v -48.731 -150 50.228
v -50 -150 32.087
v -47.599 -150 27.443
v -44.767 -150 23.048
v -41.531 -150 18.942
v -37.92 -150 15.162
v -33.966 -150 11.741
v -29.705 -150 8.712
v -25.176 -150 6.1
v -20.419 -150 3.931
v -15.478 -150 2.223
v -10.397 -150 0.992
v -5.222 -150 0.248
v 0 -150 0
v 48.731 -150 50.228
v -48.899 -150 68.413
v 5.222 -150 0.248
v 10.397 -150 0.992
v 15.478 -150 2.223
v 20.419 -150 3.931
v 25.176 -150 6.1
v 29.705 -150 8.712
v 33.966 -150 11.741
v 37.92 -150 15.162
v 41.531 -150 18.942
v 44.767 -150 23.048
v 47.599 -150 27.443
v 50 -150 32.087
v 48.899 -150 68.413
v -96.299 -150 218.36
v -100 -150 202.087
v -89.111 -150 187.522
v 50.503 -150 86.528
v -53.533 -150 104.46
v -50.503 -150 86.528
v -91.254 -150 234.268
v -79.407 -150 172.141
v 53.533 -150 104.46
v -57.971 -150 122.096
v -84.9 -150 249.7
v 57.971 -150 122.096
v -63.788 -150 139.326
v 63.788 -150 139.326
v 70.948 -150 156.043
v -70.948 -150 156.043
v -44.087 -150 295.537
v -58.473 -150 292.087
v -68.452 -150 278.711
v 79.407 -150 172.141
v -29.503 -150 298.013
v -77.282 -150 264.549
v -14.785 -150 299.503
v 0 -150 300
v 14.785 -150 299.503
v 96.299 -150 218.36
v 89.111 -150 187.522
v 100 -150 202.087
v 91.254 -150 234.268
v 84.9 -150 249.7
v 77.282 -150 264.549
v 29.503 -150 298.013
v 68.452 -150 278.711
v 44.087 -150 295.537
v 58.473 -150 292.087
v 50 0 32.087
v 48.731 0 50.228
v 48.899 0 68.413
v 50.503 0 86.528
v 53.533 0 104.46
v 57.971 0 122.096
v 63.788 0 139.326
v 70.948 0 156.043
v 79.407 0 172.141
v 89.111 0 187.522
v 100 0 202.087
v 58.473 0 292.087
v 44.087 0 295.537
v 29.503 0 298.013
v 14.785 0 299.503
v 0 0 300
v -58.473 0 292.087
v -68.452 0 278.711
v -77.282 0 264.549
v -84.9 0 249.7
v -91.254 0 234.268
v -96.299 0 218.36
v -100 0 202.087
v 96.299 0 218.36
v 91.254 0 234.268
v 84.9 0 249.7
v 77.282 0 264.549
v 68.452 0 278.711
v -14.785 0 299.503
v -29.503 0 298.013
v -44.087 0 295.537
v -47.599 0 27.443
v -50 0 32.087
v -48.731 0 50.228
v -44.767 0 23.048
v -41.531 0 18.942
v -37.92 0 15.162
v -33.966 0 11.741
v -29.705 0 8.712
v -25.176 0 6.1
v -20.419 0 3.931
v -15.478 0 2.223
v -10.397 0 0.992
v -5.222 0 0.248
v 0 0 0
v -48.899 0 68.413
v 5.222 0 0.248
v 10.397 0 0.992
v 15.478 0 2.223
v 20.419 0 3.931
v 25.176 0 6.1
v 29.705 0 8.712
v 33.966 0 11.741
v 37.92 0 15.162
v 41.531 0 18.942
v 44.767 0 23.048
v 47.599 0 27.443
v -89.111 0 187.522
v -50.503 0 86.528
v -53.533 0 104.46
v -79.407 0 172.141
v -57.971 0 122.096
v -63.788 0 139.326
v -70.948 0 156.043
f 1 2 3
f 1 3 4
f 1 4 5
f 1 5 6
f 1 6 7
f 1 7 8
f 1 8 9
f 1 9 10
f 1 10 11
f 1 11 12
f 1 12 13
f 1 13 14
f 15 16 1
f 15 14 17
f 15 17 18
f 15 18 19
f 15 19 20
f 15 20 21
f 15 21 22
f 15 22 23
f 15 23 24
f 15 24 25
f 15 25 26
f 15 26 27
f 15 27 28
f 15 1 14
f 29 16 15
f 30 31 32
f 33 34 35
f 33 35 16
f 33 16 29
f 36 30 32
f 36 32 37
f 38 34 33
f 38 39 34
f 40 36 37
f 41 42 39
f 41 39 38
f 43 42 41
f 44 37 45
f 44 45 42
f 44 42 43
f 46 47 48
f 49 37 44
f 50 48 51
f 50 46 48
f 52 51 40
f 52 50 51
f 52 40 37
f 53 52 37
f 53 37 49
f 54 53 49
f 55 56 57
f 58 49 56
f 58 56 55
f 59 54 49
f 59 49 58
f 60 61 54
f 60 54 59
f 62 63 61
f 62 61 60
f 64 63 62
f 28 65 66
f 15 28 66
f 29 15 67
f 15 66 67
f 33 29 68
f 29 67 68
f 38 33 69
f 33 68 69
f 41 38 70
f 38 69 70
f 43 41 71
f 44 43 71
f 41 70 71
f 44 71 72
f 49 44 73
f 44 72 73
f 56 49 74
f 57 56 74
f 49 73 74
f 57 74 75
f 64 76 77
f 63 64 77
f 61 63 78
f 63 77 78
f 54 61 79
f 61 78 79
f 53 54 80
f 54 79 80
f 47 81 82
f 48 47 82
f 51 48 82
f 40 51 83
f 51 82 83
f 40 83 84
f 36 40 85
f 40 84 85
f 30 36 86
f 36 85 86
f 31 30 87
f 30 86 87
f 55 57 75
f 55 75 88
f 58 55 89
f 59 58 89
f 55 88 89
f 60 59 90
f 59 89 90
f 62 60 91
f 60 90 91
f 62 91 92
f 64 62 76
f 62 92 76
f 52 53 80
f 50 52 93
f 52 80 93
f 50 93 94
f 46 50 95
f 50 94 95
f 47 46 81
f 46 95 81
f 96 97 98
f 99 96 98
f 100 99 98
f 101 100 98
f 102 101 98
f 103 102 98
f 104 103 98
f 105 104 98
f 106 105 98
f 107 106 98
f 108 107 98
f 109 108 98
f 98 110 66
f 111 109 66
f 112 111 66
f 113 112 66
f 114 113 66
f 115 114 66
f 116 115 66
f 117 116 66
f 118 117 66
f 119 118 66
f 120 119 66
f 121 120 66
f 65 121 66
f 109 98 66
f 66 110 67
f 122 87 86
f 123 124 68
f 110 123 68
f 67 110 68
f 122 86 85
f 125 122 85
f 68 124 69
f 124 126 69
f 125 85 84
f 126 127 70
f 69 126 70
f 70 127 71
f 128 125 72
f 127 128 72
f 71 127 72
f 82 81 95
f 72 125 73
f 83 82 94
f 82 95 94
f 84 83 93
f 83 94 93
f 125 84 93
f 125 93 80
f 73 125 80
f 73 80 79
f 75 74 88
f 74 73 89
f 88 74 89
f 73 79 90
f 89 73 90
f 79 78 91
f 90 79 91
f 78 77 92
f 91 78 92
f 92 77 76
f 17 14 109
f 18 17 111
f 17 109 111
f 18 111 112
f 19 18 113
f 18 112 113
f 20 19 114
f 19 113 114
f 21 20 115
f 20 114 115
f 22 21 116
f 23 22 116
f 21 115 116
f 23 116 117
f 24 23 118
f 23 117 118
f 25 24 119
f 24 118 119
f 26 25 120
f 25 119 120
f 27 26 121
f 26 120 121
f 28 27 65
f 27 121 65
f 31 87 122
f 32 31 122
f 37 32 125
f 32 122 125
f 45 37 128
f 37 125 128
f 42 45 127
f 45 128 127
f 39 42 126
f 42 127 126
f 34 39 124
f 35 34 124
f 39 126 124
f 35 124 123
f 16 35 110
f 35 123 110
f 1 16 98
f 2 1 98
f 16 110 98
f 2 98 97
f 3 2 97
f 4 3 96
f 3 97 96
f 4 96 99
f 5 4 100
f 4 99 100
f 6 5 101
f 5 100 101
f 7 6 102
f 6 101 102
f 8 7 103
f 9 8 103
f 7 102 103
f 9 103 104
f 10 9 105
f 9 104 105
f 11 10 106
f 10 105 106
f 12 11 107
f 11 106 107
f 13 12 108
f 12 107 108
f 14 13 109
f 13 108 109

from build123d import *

# Parameters (mm, degrees)
F1_DEPTH = 150


with BuildPart() as f1:
    # F0 (on Front) → F1 (new body)
    with BuildSketch(Plane.XZ):
        with BuildLine():
            ThreePointArc((100, 202.087122), (84.900082, 249.700459), (58.472668, 292.087122))
            ThreePointArc((58.472668, 292.087122), (29.502824, 298.012806), (0, 300))
            ThreePointArc((0, 300), (-29.502824, 298.012806), (-58.472668, 292.087122))
            ThreePointArc((-58.472668, 292.087122), (-84.900082, 249.700459), (-100, 202.087122))
            ThreePointArc((-100, 202.087122), (-57.971121, 122.095615), (-50, 32.087122))
            ThreePointArc((-50, 32.087122), (-29.705148, 8.711728), (0, 0))
            ThreePointArc((0, 0), (29.705148, 8.711728), (50, 32.087122))
            ThreePointArc((50, 32.087122), (57.971121, 122.095615), (100, 202.087122))
        make_face()
    extrude(amount=F1_DEPTH)


solid = f1.part
